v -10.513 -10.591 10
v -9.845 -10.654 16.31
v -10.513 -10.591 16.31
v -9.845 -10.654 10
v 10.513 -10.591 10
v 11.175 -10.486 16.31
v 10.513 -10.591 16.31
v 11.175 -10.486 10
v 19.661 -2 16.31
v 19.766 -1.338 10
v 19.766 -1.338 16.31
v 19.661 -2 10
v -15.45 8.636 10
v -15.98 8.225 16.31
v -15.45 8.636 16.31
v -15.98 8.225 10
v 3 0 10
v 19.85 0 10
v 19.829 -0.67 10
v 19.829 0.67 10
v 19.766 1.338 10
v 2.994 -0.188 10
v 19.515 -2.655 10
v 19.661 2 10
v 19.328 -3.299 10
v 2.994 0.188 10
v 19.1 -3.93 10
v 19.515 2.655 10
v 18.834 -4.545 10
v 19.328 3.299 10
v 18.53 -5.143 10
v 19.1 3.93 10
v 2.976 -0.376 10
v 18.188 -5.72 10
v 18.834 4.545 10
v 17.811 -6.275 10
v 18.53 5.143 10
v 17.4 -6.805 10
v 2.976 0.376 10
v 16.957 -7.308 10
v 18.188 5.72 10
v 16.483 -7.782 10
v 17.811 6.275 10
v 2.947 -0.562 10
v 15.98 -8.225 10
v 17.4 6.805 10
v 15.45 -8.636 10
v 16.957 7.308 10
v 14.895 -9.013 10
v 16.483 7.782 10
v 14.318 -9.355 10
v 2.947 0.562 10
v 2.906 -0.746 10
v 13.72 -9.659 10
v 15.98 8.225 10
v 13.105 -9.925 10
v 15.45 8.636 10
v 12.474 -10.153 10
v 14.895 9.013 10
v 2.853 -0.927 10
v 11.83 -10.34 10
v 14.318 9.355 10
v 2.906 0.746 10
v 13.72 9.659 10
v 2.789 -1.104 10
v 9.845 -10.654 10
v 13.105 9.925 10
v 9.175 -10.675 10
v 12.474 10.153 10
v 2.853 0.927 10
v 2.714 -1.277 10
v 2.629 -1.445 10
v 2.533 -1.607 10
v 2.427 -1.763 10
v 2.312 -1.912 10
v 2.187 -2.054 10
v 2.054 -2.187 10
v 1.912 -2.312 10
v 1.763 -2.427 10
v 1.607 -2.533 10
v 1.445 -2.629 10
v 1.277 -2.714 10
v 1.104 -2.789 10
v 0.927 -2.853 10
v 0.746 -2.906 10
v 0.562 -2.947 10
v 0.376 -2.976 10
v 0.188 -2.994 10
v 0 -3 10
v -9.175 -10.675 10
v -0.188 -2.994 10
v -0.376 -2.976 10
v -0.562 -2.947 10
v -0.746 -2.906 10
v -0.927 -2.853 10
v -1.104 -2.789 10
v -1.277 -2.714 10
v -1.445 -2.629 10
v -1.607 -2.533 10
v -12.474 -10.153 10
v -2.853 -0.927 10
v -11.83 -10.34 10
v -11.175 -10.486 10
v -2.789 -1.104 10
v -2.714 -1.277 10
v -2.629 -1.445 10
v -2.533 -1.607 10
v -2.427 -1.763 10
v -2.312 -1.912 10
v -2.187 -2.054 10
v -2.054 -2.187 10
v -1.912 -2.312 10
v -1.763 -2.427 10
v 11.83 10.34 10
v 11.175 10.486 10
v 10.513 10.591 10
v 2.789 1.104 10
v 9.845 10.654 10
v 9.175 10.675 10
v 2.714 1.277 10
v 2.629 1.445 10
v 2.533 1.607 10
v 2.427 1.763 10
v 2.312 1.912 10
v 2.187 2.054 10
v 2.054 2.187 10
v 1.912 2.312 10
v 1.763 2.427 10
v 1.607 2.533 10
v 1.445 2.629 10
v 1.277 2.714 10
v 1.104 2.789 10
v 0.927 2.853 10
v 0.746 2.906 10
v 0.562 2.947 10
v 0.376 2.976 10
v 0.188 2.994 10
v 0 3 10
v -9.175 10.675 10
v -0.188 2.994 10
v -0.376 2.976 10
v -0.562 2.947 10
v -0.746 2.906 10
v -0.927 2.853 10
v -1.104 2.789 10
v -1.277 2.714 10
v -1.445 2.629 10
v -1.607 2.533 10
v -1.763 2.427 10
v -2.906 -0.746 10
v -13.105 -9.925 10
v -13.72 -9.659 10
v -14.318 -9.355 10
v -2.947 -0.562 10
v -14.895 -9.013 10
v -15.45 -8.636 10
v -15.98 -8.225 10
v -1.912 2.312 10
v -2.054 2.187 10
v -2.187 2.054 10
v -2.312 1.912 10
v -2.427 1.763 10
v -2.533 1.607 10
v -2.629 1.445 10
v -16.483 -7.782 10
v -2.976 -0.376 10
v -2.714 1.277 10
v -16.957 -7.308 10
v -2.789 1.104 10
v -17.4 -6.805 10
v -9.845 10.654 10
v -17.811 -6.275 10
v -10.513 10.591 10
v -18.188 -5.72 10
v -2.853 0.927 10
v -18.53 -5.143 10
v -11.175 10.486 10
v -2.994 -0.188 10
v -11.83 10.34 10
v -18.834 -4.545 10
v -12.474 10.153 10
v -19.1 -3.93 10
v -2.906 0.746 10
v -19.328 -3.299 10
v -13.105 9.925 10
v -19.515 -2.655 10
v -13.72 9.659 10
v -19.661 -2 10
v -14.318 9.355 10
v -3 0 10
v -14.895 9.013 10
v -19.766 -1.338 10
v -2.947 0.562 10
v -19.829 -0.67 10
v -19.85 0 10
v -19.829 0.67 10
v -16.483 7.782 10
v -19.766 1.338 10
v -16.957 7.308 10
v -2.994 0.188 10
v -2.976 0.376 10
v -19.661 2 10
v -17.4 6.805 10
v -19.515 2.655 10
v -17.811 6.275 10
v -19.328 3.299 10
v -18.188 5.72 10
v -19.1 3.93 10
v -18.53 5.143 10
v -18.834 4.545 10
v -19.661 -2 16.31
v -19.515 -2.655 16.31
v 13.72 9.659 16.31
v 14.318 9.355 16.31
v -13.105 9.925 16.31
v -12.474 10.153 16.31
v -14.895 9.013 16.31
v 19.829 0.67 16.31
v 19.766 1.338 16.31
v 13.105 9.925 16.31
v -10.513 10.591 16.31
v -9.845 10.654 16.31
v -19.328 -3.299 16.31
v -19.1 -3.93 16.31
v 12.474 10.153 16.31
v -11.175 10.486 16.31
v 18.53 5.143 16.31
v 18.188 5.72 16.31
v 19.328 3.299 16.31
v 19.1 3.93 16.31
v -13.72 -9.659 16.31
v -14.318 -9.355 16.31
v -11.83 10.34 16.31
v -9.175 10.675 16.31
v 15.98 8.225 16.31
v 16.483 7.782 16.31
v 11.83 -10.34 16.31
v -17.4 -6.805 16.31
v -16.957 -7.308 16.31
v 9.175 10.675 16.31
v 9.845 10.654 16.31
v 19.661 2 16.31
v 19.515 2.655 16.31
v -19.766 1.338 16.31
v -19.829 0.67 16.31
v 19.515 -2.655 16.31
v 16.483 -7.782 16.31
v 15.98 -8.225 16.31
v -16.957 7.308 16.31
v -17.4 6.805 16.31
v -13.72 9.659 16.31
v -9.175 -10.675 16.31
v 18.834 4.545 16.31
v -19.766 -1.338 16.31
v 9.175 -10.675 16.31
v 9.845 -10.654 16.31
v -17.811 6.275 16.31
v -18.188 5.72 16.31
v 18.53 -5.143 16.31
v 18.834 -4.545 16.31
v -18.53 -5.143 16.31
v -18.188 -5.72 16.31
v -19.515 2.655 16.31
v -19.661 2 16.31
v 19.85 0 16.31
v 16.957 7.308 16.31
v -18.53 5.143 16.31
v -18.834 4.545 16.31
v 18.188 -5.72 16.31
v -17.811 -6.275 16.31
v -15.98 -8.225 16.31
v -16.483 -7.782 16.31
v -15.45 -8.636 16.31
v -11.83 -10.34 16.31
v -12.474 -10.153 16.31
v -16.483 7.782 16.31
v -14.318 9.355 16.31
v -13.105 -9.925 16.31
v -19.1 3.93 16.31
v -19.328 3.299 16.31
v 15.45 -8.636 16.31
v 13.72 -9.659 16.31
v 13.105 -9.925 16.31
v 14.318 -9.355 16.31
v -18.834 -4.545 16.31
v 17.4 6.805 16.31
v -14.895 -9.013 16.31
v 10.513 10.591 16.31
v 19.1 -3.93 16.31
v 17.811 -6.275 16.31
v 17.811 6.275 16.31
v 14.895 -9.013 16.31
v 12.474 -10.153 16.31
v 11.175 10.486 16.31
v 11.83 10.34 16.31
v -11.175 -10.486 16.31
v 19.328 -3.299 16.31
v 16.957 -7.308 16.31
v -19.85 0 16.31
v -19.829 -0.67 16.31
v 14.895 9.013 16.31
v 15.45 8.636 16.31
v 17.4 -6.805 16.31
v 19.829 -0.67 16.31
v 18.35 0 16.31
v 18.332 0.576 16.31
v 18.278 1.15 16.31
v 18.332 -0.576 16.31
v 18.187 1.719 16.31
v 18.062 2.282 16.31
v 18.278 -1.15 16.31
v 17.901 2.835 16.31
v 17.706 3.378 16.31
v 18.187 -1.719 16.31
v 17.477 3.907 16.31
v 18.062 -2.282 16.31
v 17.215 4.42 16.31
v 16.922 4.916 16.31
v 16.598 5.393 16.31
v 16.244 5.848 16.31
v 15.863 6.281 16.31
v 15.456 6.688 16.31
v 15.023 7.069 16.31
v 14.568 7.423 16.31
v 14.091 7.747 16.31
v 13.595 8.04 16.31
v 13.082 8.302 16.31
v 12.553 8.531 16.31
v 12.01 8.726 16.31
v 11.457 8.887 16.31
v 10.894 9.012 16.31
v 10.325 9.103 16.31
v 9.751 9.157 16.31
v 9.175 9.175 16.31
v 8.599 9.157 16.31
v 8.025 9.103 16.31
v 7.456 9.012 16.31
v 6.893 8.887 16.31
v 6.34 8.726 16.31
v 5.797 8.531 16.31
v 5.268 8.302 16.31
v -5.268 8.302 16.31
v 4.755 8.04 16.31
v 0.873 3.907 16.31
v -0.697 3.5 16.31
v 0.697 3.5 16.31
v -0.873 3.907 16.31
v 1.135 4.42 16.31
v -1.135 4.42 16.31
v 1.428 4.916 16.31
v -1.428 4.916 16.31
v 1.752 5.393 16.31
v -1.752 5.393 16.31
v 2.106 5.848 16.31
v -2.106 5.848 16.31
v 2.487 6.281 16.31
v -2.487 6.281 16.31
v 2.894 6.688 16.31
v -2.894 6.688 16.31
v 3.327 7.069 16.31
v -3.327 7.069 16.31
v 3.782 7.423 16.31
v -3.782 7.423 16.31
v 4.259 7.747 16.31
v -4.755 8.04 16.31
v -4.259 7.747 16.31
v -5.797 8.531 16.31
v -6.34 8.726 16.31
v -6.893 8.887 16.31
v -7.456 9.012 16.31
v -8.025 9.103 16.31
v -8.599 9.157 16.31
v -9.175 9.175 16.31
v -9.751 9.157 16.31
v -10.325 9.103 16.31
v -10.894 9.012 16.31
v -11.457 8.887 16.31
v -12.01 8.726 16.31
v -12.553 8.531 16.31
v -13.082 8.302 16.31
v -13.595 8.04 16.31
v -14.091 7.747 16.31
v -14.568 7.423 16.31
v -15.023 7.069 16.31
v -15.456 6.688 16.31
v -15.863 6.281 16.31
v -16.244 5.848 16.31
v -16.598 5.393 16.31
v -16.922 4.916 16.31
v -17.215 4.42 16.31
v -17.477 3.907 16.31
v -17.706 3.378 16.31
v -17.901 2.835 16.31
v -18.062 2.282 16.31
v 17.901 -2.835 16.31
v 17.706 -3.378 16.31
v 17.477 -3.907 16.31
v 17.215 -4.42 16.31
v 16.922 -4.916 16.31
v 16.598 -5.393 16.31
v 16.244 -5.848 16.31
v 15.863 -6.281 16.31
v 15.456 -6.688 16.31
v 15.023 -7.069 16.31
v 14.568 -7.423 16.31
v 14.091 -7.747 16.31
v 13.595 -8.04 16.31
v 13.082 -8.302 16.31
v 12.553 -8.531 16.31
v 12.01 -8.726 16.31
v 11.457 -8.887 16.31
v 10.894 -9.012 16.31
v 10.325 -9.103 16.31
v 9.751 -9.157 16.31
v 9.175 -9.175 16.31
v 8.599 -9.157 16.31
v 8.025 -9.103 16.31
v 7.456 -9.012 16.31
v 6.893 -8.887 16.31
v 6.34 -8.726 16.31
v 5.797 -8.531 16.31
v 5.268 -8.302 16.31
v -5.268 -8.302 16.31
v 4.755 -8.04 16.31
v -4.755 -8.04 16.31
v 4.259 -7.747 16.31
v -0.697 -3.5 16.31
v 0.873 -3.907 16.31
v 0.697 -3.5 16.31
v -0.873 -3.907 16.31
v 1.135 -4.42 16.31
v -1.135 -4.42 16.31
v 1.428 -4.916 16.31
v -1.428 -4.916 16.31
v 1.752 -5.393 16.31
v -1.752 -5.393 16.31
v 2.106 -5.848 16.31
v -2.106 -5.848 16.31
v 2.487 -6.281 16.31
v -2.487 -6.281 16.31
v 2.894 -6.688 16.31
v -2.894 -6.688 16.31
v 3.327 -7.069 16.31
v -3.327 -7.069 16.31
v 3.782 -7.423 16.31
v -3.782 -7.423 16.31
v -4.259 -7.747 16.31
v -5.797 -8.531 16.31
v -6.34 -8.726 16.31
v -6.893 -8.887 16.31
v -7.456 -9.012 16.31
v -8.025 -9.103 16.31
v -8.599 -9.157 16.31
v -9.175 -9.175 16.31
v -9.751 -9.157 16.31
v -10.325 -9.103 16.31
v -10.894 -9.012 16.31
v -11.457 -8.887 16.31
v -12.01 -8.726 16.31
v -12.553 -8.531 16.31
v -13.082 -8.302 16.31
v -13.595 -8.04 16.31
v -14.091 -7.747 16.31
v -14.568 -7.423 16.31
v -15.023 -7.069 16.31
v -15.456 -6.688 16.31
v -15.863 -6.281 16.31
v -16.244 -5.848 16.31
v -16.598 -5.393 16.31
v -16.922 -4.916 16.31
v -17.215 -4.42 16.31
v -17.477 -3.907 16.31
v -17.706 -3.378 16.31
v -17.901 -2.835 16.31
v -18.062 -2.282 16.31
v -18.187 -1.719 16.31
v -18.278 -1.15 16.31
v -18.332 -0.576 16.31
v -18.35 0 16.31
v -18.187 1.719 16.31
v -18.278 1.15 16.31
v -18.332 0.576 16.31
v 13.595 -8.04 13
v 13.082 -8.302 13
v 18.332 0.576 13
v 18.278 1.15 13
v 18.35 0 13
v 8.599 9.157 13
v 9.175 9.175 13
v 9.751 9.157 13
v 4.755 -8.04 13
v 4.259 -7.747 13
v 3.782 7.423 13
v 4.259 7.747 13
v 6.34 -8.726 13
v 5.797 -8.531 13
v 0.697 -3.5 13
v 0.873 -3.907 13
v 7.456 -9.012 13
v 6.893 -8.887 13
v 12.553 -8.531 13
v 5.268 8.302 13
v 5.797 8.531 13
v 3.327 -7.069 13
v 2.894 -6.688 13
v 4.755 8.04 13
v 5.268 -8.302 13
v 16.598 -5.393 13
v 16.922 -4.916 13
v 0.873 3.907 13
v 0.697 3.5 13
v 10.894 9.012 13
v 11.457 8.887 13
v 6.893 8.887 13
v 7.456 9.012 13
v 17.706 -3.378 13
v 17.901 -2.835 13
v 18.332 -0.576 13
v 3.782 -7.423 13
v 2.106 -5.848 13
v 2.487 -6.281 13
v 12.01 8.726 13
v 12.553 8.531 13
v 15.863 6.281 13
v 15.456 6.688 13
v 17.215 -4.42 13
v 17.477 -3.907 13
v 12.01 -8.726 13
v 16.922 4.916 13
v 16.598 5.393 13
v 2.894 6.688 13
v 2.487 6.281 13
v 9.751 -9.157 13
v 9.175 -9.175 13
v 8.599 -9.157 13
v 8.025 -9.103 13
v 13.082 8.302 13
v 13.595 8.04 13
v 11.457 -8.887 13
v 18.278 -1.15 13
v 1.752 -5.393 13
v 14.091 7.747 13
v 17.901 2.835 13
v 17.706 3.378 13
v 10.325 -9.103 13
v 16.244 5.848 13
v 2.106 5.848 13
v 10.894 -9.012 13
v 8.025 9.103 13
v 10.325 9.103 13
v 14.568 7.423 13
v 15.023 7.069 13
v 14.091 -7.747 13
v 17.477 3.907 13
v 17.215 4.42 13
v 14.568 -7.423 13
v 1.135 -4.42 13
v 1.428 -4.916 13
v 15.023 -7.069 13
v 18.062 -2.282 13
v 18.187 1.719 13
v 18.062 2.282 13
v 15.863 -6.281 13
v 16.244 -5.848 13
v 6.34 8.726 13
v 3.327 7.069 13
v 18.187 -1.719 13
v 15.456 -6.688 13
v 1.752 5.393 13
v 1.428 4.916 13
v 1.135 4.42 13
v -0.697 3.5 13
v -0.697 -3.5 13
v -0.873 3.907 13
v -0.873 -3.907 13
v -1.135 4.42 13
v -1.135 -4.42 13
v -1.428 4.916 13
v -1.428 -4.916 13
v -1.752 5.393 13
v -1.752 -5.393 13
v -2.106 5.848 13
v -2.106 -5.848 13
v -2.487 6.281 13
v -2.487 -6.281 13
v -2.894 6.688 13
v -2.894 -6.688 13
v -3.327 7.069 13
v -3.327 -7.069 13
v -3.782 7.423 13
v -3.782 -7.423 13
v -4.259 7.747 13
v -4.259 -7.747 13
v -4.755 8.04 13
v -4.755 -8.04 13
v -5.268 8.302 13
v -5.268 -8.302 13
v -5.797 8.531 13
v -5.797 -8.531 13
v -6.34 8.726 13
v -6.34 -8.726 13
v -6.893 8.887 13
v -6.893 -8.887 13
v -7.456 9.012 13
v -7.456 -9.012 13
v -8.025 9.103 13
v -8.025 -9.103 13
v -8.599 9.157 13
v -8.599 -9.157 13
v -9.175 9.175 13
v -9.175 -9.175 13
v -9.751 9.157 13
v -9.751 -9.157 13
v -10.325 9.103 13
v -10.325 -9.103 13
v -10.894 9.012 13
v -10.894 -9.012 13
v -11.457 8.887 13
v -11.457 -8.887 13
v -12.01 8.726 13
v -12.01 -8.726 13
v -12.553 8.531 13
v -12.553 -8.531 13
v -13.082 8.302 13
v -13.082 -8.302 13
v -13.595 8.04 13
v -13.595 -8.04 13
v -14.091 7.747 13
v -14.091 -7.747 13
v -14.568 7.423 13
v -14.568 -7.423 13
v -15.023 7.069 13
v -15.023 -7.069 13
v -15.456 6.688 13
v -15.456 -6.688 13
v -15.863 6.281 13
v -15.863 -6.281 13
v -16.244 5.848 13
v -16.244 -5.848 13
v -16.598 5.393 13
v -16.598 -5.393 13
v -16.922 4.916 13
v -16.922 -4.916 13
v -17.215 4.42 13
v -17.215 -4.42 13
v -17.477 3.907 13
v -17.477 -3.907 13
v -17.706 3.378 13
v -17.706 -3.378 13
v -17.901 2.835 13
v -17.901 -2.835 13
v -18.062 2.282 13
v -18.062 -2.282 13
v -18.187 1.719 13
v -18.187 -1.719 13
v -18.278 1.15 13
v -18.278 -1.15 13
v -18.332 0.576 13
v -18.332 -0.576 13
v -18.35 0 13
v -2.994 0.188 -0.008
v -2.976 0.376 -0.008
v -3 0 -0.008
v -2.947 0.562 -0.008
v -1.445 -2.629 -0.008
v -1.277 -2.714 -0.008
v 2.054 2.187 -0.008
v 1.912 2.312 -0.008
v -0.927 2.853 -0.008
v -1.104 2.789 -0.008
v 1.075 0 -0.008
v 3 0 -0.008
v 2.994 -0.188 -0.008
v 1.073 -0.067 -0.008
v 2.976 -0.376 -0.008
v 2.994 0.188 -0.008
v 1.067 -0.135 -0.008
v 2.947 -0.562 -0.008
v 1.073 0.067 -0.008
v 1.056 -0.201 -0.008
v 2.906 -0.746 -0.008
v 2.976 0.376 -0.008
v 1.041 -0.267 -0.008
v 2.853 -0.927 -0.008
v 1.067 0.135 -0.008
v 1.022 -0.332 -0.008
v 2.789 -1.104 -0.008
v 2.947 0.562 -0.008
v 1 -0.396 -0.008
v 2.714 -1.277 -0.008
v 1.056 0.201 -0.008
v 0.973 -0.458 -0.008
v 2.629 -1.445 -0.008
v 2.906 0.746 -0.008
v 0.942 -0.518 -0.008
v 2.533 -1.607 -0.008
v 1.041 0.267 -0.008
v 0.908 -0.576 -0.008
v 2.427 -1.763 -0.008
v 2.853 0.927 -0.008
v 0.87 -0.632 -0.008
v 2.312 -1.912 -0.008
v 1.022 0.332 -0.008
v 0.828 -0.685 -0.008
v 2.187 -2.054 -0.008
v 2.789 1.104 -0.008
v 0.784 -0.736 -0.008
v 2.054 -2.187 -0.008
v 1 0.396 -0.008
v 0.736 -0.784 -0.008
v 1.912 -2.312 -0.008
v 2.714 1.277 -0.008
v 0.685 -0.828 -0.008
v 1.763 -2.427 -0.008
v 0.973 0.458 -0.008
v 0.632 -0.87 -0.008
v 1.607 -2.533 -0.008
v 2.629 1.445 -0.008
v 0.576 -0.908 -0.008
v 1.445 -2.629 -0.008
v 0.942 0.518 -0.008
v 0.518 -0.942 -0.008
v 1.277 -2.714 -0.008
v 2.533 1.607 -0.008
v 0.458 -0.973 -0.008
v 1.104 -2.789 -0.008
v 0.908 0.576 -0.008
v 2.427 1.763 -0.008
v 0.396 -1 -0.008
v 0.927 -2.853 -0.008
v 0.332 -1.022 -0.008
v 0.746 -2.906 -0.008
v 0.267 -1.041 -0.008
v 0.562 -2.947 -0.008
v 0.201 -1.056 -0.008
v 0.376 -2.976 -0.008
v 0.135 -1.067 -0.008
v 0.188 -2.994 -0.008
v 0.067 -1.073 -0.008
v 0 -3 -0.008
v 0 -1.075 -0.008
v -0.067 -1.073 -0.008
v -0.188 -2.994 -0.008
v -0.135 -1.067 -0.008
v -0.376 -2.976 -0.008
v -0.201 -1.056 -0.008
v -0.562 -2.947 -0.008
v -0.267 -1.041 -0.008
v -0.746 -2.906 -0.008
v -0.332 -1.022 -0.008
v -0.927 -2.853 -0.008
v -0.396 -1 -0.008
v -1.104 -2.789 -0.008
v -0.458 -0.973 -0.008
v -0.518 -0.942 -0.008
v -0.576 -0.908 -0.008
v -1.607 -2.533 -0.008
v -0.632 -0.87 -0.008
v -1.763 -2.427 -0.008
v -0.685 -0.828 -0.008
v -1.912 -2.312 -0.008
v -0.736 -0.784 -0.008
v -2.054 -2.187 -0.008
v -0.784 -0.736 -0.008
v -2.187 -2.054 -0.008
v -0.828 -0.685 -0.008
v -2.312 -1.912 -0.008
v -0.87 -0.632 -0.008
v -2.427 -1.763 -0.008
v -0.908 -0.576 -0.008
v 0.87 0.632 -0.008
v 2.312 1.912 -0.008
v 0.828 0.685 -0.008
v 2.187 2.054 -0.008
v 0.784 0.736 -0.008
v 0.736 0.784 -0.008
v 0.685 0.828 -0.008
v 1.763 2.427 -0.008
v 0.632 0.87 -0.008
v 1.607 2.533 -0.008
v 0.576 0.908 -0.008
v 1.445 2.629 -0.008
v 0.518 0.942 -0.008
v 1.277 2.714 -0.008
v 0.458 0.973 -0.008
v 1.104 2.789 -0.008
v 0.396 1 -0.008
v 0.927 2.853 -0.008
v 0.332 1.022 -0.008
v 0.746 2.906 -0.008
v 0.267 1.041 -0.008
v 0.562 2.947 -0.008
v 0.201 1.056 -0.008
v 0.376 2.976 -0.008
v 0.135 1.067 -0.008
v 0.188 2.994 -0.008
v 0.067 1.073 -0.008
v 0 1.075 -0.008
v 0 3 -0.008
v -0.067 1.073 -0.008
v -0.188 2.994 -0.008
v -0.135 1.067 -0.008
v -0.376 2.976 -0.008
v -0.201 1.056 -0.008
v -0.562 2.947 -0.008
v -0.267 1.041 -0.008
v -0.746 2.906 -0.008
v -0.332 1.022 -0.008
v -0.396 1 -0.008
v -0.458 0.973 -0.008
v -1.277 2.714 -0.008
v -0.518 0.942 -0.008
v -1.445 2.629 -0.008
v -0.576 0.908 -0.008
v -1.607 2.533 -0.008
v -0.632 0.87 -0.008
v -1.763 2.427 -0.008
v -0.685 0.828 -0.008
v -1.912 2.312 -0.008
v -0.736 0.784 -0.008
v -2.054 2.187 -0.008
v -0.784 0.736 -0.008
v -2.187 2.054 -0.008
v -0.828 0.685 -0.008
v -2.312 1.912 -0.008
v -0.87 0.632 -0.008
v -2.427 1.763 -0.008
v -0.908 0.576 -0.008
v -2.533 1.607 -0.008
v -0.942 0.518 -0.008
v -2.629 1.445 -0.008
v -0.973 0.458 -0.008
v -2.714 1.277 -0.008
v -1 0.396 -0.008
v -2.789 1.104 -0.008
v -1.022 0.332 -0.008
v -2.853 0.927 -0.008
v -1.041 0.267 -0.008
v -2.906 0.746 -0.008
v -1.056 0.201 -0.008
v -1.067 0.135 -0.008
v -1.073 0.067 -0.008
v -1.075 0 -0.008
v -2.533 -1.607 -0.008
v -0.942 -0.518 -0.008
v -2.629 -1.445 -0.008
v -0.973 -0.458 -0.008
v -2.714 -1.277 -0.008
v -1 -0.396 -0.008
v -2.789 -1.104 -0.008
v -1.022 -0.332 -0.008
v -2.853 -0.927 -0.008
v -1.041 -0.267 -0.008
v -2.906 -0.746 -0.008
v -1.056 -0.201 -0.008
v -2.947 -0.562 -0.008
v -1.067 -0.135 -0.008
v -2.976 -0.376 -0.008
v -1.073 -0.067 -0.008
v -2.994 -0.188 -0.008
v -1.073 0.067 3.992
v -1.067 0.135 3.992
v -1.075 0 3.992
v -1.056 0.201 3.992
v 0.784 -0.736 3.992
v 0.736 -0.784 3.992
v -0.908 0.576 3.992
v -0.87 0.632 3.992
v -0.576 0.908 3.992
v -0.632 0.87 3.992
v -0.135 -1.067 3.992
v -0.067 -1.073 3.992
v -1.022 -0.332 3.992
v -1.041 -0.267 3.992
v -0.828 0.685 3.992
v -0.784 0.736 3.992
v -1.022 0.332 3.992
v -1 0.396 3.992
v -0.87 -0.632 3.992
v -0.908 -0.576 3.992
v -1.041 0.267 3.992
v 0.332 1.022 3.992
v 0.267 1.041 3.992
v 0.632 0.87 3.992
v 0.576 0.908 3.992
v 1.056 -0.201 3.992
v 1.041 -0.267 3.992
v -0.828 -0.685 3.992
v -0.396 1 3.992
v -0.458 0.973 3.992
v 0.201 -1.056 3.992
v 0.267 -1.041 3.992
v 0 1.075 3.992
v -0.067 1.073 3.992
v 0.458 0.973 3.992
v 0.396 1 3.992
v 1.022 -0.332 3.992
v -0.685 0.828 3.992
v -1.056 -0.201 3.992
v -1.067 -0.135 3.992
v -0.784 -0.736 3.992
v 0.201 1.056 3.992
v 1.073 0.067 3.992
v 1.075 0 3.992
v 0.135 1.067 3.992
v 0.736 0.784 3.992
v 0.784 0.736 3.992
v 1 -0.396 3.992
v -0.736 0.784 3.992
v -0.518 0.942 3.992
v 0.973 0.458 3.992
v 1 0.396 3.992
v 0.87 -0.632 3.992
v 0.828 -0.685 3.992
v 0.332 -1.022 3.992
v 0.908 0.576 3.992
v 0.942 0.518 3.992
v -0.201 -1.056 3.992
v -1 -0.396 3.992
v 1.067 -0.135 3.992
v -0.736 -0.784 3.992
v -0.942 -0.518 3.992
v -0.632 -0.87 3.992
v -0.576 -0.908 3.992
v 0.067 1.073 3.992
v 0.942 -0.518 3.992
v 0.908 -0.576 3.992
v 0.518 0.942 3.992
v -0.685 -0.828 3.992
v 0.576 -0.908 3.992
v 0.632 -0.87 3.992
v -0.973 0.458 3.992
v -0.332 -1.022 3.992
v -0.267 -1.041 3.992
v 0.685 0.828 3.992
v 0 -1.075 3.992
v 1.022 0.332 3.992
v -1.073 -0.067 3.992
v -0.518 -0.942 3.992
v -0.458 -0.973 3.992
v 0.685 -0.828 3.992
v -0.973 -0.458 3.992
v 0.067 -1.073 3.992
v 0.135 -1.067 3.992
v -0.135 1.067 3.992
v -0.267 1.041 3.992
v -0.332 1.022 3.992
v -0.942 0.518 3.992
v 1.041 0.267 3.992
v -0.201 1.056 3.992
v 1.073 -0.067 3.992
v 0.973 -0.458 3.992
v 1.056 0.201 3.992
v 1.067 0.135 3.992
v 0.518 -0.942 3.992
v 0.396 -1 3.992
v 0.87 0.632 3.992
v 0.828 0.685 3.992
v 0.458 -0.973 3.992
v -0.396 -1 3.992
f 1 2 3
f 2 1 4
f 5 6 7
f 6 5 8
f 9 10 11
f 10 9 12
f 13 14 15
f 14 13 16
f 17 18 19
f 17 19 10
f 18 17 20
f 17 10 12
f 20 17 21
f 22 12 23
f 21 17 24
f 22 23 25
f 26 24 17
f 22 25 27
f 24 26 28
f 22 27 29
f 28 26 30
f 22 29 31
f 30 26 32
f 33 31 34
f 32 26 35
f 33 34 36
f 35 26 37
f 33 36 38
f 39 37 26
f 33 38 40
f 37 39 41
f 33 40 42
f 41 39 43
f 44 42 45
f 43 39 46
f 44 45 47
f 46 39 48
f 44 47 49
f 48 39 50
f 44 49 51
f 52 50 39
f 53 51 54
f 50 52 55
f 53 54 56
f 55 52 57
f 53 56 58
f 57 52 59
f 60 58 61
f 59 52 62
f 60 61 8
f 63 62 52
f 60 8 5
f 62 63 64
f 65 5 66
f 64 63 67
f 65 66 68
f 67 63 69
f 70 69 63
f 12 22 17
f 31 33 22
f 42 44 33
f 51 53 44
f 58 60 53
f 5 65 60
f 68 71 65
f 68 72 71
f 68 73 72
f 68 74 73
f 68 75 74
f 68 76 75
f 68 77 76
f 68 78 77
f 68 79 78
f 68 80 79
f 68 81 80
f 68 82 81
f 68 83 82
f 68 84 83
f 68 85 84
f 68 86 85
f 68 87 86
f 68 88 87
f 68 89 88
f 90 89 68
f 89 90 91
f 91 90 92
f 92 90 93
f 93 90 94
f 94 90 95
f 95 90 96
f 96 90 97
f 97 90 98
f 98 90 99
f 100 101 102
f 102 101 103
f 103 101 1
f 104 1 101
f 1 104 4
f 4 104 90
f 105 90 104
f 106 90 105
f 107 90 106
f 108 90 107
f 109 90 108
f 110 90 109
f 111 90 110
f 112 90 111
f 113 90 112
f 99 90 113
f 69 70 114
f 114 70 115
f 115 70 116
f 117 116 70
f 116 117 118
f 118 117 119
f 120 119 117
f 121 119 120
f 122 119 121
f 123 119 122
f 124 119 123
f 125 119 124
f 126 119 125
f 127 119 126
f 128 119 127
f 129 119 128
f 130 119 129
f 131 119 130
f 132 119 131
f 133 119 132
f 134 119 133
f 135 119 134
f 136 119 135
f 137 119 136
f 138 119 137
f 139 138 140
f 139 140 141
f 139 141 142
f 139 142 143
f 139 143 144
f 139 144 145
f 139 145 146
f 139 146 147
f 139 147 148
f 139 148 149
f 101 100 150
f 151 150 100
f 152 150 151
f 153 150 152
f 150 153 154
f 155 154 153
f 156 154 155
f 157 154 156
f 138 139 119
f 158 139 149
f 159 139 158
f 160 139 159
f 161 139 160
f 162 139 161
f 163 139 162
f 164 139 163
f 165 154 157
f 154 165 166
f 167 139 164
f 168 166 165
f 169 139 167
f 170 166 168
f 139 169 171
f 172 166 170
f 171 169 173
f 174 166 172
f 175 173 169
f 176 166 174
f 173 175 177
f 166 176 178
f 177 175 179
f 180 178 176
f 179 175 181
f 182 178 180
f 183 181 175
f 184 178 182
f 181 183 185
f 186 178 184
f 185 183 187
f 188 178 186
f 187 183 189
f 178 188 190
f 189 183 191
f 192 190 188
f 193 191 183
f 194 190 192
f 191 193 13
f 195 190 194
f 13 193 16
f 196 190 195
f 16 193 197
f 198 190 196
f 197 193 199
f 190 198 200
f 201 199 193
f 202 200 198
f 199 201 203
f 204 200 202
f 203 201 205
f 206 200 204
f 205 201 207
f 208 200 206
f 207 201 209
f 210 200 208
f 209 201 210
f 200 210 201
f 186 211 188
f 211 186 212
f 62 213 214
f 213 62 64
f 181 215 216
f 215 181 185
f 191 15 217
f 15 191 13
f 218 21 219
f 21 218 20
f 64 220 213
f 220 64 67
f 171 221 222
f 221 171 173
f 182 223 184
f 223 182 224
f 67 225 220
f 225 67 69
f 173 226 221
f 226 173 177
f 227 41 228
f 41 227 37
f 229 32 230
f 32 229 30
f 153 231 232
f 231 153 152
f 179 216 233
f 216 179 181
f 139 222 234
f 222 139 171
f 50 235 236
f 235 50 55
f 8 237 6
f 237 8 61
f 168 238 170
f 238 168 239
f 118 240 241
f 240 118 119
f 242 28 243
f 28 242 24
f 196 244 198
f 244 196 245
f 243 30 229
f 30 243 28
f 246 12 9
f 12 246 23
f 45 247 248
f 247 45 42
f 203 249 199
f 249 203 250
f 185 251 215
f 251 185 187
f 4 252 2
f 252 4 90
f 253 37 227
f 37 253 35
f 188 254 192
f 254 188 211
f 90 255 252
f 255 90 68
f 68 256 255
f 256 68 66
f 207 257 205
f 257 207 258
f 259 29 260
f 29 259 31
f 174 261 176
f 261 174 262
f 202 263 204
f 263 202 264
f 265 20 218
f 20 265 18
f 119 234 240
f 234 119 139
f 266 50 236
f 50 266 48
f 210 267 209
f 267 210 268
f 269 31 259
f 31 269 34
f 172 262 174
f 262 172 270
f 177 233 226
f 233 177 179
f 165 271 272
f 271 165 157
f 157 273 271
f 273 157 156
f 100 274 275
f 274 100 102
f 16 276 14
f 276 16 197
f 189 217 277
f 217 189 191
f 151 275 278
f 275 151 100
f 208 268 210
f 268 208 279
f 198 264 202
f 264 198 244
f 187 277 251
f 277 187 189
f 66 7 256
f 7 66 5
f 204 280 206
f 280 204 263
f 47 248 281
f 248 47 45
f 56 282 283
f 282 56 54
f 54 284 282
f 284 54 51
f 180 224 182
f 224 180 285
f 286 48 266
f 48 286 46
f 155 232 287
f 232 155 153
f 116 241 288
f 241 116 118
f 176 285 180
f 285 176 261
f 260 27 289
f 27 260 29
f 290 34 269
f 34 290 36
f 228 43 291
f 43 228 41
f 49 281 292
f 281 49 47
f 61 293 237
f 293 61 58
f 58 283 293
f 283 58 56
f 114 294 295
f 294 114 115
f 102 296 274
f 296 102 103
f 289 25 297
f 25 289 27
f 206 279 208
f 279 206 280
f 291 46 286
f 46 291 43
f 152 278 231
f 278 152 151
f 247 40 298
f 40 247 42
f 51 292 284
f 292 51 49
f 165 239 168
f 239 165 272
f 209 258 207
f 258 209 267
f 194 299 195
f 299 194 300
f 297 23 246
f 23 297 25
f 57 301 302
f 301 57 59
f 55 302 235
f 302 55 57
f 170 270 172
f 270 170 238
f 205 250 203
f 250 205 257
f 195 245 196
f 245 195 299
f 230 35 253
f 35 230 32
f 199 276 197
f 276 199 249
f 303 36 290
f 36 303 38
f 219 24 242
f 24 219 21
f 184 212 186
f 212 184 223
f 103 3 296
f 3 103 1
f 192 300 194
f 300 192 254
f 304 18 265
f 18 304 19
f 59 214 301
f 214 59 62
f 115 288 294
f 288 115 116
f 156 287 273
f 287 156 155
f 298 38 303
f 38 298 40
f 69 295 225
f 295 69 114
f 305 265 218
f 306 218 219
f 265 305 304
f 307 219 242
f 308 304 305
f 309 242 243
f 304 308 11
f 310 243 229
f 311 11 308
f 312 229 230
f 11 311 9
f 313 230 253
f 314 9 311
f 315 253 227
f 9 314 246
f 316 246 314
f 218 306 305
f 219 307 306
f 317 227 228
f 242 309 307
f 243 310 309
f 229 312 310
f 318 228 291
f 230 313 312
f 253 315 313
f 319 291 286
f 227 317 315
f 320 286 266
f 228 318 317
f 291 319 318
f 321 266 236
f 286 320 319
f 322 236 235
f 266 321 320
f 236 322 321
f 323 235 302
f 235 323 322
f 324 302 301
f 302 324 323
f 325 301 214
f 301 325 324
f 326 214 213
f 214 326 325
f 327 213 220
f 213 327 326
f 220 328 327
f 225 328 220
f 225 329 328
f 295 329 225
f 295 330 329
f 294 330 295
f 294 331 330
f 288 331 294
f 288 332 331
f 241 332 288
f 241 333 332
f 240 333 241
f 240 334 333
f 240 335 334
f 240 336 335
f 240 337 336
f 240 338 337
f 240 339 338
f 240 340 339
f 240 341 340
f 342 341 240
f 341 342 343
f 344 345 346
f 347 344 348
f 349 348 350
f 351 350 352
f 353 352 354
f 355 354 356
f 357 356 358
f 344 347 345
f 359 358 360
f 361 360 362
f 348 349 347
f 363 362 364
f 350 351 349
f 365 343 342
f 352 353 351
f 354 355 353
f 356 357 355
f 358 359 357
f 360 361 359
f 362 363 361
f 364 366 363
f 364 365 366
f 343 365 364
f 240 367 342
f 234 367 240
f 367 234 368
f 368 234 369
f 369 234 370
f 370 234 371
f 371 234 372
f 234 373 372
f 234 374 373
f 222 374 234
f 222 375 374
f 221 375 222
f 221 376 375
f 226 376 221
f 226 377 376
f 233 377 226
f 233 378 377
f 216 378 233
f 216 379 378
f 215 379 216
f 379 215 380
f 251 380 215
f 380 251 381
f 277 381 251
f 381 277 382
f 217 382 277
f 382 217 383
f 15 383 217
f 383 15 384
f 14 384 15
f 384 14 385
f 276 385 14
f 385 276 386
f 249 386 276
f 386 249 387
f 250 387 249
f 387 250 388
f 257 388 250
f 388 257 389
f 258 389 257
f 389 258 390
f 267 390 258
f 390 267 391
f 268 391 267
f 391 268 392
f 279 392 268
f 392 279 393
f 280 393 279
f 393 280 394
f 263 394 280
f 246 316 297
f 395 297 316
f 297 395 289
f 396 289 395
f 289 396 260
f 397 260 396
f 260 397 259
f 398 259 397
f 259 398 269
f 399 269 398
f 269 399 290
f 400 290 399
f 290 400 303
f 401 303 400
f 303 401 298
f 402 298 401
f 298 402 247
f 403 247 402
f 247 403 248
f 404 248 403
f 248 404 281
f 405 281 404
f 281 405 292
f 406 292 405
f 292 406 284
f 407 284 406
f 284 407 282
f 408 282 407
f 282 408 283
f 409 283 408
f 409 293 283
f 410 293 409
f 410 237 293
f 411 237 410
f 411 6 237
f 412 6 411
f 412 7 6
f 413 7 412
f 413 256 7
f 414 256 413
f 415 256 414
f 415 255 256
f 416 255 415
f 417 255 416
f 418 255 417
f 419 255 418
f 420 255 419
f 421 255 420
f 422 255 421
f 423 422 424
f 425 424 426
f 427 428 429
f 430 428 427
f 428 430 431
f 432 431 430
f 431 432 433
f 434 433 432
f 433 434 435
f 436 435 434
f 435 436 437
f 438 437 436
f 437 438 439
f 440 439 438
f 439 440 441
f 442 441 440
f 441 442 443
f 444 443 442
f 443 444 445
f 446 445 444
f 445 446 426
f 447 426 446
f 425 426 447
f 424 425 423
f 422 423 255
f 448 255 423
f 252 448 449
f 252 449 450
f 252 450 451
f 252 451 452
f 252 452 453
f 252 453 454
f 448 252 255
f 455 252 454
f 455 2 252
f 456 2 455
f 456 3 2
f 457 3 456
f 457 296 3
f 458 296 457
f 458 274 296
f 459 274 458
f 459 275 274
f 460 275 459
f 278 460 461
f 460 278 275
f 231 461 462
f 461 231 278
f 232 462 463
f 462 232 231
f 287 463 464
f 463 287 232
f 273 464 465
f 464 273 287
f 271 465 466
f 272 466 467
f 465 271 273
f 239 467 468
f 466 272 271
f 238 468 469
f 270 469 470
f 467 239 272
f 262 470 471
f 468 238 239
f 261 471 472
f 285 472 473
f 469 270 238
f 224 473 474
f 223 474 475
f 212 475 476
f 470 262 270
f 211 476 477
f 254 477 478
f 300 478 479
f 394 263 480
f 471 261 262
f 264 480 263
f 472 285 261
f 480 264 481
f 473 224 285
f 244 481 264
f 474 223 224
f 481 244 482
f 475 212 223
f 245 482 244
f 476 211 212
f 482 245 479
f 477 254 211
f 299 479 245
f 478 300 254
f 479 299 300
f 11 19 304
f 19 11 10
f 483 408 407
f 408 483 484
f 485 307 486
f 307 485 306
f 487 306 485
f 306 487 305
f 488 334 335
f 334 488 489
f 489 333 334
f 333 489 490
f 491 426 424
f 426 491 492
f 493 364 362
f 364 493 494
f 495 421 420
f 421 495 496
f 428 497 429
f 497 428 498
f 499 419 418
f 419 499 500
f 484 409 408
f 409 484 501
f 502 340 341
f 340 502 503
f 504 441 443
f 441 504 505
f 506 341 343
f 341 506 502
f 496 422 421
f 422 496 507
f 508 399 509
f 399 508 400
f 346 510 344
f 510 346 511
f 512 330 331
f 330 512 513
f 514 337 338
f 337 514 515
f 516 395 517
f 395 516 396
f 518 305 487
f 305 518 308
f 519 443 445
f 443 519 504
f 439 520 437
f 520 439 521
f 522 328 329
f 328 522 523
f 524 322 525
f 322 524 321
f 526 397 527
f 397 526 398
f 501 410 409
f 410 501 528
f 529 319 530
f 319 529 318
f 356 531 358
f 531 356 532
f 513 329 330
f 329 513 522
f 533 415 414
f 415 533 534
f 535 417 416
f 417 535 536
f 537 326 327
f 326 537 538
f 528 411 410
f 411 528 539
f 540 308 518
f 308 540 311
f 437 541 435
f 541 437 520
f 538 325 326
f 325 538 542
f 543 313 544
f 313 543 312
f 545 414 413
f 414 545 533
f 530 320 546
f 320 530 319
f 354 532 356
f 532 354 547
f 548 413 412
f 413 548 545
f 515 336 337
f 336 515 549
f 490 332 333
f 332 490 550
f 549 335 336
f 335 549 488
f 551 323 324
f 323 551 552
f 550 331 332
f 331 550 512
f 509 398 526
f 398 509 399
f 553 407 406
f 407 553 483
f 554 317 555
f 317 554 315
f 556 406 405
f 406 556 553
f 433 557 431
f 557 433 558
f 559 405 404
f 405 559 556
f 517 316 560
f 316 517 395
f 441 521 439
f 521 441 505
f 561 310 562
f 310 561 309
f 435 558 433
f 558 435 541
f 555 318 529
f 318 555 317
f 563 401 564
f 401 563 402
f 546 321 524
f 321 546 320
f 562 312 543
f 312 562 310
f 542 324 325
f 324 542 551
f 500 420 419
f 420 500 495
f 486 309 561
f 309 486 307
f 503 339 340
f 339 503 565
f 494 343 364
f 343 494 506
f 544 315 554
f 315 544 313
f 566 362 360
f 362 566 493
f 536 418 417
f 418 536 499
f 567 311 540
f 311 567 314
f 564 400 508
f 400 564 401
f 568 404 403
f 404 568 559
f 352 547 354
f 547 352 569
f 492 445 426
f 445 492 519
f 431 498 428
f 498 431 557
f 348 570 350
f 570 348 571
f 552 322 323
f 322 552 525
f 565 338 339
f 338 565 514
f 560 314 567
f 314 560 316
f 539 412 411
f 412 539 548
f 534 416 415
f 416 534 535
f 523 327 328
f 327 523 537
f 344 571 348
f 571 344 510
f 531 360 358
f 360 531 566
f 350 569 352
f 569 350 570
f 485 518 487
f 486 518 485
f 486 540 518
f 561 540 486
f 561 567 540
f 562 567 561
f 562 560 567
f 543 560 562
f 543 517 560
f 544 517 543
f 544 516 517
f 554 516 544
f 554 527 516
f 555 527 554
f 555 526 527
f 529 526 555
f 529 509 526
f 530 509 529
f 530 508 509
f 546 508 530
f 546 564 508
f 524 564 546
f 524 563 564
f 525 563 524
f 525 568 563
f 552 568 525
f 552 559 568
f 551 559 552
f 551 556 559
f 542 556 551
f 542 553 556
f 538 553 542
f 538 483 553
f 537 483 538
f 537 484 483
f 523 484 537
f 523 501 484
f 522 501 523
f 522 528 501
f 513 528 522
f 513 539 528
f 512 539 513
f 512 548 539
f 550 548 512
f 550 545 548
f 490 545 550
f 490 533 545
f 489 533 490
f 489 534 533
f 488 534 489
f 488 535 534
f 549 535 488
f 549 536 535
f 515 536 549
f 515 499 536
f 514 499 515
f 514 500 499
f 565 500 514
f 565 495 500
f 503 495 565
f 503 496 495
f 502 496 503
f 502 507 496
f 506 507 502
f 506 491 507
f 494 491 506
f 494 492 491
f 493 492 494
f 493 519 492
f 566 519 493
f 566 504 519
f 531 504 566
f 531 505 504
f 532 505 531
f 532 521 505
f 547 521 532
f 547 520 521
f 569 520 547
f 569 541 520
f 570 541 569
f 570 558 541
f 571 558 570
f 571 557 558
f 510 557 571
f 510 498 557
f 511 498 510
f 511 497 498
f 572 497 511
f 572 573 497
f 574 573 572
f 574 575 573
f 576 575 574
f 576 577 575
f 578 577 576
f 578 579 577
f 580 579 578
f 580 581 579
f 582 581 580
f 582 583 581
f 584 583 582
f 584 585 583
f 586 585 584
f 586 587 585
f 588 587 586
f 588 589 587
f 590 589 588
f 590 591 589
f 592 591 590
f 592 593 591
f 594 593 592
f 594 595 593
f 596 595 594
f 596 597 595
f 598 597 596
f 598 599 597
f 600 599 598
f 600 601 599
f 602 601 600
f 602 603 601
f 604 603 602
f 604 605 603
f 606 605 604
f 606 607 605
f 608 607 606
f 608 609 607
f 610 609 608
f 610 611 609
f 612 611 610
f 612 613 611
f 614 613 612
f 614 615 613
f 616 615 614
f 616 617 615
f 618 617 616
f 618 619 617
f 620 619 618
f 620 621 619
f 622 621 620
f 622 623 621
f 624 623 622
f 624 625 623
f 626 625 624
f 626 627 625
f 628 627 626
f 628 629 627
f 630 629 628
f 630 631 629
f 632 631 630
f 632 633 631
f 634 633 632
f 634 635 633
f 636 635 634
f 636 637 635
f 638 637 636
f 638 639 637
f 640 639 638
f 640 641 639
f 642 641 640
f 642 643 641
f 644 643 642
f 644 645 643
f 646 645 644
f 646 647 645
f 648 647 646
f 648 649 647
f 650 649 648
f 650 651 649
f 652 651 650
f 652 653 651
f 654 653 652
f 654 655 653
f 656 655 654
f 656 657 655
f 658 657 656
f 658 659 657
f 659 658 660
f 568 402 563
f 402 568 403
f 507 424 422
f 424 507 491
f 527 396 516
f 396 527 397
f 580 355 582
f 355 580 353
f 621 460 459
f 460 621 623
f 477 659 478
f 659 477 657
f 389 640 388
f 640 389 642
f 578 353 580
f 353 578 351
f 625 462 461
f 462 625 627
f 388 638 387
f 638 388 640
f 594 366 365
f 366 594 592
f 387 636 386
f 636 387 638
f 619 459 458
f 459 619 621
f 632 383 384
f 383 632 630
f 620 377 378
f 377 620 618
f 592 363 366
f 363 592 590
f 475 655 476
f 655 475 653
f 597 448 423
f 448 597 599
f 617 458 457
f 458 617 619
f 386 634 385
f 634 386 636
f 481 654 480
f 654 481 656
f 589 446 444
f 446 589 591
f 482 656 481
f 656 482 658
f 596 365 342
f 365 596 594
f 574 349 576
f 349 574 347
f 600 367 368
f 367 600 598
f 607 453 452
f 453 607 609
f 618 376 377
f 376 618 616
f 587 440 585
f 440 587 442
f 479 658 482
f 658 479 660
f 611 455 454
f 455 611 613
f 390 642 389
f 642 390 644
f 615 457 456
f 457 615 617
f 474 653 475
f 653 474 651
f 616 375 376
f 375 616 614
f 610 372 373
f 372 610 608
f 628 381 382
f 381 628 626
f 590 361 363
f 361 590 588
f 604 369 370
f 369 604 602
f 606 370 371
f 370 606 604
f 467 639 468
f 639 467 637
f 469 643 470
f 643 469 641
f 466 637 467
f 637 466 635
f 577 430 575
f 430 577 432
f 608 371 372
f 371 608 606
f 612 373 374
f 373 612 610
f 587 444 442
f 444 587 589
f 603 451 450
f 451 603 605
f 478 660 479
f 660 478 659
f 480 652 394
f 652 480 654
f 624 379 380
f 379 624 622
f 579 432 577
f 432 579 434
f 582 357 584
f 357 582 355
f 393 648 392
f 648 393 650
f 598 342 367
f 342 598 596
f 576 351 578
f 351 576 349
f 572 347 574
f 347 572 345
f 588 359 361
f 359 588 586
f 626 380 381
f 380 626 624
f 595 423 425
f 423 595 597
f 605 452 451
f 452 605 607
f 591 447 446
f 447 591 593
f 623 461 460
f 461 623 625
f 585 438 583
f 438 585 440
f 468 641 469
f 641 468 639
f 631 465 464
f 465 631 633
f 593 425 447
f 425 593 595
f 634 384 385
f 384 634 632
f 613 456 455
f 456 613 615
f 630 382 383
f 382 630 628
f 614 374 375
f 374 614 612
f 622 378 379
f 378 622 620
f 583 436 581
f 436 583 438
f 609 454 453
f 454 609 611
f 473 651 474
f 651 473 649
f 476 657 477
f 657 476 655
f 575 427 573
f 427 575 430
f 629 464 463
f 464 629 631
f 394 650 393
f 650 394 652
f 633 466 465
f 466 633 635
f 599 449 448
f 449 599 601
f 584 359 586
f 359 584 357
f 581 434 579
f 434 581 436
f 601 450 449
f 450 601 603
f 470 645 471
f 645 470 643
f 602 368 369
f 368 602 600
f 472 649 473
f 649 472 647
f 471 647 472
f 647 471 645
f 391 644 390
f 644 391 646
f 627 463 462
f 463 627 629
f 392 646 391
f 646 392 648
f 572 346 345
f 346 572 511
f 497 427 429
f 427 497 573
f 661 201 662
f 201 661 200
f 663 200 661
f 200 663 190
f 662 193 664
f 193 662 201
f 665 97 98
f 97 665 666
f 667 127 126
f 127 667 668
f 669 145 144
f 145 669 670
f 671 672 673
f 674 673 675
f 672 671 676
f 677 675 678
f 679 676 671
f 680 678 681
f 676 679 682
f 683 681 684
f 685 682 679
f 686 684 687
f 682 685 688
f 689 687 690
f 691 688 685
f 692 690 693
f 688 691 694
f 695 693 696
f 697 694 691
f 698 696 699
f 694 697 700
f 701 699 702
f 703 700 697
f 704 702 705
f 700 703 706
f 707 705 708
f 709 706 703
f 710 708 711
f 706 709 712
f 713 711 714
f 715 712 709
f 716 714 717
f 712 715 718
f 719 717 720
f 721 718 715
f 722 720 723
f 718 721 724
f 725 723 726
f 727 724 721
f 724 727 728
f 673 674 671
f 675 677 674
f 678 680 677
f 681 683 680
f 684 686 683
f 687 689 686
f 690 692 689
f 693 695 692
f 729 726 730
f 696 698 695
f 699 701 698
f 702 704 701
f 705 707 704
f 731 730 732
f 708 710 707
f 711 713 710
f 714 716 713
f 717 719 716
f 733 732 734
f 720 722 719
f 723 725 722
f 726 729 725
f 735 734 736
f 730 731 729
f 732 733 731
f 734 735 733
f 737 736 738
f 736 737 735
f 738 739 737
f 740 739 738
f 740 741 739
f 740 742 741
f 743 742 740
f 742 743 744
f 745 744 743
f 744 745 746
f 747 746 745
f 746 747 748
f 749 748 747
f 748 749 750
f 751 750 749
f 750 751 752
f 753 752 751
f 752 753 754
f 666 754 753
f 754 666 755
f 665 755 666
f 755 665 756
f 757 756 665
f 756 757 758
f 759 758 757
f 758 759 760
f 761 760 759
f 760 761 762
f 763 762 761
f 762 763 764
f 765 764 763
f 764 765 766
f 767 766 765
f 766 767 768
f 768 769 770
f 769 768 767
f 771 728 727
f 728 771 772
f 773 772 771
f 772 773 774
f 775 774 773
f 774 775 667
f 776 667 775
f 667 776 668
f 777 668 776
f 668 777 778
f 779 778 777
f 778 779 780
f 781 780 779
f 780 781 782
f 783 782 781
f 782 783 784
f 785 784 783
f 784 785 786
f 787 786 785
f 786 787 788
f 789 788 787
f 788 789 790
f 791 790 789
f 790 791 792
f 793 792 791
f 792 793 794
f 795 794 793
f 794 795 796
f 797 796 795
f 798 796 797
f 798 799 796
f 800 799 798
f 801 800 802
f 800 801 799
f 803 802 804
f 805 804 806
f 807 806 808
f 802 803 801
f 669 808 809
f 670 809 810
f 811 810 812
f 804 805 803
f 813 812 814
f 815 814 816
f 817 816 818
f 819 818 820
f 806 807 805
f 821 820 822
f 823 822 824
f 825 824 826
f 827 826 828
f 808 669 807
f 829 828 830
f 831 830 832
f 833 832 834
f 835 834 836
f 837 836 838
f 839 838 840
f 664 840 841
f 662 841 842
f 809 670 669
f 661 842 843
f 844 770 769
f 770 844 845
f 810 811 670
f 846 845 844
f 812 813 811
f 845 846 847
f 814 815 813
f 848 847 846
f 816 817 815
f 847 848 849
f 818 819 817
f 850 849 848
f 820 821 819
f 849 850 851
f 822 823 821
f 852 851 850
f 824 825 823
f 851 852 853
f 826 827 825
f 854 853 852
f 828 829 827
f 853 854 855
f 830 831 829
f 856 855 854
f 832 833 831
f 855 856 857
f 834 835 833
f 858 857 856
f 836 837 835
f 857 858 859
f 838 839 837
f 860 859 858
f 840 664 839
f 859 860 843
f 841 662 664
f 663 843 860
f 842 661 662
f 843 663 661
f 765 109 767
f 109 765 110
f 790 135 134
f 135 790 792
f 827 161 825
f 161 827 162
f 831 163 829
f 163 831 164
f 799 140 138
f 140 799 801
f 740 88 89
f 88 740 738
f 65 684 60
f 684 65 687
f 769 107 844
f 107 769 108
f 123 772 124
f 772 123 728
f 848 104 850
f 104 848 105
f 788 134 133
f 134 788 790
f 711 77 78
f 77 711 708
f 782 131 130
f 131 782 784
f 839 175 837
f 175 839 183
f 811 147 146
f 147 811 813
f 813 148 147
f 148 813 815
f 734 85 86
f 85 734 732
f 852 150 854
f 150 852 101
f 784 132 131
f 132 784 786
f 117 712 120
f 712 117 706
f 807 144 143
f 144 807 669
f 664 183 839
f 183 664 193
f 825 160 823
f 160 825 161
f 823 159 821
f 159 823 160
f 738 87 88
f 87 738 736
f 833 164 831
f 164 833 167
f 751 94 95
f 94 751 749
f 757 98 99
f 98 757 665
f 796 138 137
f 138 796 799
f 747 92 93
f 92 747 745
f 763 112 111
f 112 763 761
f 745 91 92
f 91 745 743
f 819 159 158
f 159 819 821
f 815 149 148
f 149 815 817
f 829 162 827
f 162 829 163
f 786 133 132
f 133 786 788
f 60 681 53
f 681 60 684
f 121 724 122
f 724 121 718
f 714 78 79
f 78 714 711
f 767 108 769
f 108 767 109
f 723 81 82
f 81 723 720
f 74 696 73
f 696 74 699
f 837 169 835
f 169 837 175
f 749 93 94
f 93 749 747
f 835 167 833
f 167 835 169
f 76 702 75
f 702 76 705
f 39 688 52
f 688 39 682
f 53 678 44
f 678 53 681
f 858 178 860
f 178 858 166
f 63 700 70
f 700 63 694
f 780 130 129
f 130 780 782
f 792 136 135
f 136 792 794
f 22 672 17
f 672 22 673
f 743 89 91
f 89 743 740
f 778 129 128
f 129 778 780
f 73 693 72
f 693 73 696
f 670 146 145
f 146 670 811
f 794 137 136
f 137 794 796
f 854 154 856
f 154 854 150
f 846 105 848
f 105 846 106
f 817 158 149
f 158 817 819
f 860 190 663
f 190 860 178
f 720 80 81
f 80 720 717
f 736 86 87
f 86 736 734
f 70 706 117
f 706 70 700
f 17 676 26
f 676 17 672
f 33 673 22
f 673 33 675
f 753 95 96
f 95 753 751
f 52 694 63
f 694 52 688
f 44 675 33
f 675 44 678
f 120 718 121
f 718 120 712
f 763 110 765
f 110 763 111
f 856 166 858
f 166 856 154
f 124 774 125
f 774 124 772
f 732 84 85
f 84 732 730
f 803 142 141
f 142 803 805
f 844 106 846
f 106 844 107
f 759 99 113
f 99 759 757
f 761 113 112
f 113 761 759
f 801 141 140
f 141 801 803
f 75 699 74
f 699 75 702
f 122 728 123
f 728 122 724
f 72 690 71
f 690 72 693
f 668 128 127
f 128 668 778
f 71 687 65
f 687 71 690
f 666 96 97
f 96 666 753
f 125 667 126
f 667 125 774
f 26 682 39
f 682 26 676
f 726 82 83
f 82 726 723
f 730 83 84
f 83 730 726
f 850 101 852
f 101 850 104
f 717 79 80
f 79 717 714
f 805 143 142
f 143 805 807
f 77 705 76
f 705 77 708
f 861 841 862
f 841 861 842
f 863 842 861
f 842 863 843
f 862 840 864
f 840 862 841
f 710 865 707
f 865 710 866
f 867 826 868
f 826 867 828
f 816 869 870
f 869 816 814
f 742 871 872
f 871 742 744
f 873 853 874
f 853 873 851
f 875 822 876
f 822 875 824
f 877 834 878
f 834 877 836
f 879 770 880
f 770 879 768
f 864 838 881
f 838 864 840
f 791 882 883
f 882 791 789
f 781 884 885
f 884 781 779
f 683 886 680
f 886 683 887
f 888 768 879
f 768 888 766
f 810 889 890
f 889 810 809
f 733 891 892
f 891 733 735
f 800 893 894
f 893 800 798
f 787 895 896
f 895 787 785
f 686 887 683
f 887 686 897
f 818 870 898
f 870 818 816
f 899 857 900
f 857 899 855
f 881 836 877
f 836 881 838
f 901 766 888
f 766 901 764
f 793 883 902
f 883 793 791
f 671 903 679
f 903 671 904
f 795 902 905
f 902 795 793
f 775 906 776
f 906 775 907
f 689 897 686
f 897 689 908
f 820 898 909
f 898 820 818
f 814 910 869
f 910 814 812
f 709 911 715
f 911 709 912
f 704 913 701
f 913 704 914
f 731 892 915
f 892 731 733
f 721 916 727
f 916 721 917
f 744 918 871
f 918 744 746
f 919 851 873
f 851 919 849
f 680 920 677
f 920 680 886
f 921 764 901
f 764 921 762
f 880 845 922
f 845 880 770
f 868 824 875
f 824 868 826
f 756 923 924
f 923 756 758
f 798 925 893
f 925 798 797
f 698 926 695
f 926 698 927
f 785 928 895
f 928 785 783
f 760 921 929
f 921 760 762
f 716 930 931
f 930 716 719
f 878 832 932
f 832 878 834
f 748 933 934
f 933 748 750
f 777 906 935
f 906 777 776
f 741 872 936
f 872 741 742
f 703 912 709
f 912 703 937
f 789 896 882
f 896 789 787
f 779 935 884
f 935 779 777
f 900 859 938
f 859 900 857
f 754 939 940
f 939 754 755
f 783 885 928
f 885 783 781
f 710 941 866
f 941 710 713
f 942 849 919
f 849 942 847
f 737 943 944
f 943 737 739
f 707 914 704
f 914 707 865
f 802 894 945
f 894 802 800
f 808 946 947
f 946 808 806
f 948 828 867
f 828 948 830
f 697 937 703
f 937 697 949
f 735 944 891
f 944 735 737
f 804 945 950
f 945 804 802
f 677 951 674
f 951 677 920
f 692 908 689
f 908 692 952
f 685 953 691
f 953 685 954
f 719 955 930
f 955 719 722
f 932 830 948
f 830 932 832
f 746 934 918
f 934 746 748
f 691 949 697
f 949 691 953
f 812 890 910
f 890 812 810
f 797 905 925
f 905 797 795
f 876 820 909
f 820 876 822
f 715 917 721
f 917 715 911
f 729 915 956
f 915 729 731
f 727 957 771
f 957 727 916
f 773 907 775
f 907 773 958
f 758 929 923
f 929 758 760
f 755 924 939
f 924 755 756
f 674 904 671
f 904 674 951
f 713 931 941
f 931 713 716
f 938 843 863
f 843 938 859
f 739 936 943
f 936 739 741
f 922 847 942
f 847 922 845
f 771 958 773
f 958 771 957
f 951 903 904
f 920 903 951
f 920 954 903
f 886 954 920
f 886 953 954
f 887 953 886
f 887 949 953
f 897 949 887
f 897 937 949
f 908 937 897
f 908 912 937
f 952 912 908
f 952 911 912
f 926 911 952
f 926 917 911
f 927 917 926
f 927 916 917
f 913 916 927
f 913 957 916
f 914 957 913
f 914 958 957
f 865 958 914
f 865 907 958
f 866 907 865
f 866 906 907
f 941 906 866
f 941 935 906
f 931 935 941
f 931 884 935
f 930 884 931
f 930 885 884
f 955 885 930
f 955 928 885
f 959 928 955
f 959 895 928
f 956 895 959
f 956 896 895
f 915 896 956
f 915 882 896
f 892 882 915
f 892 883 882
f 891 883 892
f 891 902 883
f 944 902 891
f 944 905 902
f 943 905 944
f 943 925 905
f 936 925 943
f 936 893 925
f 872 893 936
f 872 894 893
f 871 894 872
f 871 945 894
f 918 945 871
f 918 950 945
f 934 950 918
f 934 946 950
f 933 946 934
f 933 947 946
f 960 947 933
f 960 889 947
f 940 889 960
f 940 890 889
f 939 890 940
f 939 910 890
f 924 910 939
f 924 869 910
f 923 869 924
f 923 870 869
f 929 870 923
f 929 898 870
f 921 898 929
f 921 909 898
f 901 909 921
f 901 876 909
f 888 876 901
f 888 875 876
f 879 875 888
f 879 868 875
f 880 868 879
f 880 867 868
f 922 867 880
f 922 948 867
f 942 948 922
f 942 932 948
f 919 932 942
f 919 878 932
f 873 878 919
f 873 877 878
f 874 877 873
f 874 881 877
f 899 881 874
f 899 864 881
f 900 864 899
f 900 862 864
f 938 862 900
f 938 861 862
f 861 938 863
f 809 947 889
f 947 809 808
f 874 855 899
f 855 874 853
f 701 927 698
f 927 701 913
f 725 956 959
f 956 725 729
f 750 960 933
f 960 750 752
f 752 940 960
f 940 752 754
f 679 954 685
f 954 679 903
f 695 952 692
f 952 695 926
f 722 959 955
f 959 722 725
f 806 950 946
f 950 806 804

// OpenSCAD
$fn=100;
eps=1/128;

magnet_diameter = 18.00;
magnet_height = 2.91;

walls = 1.5;

magnet_slot_tol = 0.35;
manget_slot_height_tol = 0.4;

magnet_slot_width = magnet_diameter + magnet_slot_tol;
magnet_slot_height = magnet_height + manget_slot_height_tol;

cross_length = 7;
cross_tol = 0.3;

pin = 2.15;
pin_height = 4;
pin_diameter = 6;
pin_diameter_tol = 0.15;

adapter_height = 13;

magnet_slot_edge = 2;

plate_width = magnet_slot_width*2+walls*2;
plate_height = magnet_slot_height+walls*2;

echo(plate_width);
echo(plate_height);


union() {
    translate([0,0,adapter_height-(walls*2)]) holder();
    rotate([0,180,0]) translate([0,0,-adapter_height+eps]) pin_header();
}



module holder() {
    difference() {
        hull() {
          translate([magnet_slot_width/2,0,0]) cylinder(h=plate_height, r=magnet_slot_width/2+walls);
          translate([-magnet_slot_width/2,0,0]) cylinder(h=plate_height, r=magnet_slot_width/2+walls);
        }
        translate([magnet_slot_width/2,0,plate_height-magnet_slot_height]) cylinder(h=magnet_slot_height+1, r=magnet_slot_width/2);
        translate([-magnet_slot_width/2,0,plate_height-magnet_slot_height]) cylinder(h=magnet_slot_height+1, r=magnet_slot_width/2);
        translate([0,0,10+walls*2]) cube([7,7,20], center=true);
    }
}

module cross() {
    w = walls + cross_tol;
    l = cross_length + cross_tol;
    h = walls/2+cross_tol;
    p = pin_diameter + pin_diameter_tol;
    translate([0,0,(h+1)/2-1]) cylinder(h=h+100,r=p/2, center=true);
}

module pin_header() {
    difference() {
        cylinder(h=adapter_height,r=pin_diameter/2);
        translate([0,0,adapter_height-pin_height]) cylinder(h=adapter_height+10,r=pin/2);
    }
}
